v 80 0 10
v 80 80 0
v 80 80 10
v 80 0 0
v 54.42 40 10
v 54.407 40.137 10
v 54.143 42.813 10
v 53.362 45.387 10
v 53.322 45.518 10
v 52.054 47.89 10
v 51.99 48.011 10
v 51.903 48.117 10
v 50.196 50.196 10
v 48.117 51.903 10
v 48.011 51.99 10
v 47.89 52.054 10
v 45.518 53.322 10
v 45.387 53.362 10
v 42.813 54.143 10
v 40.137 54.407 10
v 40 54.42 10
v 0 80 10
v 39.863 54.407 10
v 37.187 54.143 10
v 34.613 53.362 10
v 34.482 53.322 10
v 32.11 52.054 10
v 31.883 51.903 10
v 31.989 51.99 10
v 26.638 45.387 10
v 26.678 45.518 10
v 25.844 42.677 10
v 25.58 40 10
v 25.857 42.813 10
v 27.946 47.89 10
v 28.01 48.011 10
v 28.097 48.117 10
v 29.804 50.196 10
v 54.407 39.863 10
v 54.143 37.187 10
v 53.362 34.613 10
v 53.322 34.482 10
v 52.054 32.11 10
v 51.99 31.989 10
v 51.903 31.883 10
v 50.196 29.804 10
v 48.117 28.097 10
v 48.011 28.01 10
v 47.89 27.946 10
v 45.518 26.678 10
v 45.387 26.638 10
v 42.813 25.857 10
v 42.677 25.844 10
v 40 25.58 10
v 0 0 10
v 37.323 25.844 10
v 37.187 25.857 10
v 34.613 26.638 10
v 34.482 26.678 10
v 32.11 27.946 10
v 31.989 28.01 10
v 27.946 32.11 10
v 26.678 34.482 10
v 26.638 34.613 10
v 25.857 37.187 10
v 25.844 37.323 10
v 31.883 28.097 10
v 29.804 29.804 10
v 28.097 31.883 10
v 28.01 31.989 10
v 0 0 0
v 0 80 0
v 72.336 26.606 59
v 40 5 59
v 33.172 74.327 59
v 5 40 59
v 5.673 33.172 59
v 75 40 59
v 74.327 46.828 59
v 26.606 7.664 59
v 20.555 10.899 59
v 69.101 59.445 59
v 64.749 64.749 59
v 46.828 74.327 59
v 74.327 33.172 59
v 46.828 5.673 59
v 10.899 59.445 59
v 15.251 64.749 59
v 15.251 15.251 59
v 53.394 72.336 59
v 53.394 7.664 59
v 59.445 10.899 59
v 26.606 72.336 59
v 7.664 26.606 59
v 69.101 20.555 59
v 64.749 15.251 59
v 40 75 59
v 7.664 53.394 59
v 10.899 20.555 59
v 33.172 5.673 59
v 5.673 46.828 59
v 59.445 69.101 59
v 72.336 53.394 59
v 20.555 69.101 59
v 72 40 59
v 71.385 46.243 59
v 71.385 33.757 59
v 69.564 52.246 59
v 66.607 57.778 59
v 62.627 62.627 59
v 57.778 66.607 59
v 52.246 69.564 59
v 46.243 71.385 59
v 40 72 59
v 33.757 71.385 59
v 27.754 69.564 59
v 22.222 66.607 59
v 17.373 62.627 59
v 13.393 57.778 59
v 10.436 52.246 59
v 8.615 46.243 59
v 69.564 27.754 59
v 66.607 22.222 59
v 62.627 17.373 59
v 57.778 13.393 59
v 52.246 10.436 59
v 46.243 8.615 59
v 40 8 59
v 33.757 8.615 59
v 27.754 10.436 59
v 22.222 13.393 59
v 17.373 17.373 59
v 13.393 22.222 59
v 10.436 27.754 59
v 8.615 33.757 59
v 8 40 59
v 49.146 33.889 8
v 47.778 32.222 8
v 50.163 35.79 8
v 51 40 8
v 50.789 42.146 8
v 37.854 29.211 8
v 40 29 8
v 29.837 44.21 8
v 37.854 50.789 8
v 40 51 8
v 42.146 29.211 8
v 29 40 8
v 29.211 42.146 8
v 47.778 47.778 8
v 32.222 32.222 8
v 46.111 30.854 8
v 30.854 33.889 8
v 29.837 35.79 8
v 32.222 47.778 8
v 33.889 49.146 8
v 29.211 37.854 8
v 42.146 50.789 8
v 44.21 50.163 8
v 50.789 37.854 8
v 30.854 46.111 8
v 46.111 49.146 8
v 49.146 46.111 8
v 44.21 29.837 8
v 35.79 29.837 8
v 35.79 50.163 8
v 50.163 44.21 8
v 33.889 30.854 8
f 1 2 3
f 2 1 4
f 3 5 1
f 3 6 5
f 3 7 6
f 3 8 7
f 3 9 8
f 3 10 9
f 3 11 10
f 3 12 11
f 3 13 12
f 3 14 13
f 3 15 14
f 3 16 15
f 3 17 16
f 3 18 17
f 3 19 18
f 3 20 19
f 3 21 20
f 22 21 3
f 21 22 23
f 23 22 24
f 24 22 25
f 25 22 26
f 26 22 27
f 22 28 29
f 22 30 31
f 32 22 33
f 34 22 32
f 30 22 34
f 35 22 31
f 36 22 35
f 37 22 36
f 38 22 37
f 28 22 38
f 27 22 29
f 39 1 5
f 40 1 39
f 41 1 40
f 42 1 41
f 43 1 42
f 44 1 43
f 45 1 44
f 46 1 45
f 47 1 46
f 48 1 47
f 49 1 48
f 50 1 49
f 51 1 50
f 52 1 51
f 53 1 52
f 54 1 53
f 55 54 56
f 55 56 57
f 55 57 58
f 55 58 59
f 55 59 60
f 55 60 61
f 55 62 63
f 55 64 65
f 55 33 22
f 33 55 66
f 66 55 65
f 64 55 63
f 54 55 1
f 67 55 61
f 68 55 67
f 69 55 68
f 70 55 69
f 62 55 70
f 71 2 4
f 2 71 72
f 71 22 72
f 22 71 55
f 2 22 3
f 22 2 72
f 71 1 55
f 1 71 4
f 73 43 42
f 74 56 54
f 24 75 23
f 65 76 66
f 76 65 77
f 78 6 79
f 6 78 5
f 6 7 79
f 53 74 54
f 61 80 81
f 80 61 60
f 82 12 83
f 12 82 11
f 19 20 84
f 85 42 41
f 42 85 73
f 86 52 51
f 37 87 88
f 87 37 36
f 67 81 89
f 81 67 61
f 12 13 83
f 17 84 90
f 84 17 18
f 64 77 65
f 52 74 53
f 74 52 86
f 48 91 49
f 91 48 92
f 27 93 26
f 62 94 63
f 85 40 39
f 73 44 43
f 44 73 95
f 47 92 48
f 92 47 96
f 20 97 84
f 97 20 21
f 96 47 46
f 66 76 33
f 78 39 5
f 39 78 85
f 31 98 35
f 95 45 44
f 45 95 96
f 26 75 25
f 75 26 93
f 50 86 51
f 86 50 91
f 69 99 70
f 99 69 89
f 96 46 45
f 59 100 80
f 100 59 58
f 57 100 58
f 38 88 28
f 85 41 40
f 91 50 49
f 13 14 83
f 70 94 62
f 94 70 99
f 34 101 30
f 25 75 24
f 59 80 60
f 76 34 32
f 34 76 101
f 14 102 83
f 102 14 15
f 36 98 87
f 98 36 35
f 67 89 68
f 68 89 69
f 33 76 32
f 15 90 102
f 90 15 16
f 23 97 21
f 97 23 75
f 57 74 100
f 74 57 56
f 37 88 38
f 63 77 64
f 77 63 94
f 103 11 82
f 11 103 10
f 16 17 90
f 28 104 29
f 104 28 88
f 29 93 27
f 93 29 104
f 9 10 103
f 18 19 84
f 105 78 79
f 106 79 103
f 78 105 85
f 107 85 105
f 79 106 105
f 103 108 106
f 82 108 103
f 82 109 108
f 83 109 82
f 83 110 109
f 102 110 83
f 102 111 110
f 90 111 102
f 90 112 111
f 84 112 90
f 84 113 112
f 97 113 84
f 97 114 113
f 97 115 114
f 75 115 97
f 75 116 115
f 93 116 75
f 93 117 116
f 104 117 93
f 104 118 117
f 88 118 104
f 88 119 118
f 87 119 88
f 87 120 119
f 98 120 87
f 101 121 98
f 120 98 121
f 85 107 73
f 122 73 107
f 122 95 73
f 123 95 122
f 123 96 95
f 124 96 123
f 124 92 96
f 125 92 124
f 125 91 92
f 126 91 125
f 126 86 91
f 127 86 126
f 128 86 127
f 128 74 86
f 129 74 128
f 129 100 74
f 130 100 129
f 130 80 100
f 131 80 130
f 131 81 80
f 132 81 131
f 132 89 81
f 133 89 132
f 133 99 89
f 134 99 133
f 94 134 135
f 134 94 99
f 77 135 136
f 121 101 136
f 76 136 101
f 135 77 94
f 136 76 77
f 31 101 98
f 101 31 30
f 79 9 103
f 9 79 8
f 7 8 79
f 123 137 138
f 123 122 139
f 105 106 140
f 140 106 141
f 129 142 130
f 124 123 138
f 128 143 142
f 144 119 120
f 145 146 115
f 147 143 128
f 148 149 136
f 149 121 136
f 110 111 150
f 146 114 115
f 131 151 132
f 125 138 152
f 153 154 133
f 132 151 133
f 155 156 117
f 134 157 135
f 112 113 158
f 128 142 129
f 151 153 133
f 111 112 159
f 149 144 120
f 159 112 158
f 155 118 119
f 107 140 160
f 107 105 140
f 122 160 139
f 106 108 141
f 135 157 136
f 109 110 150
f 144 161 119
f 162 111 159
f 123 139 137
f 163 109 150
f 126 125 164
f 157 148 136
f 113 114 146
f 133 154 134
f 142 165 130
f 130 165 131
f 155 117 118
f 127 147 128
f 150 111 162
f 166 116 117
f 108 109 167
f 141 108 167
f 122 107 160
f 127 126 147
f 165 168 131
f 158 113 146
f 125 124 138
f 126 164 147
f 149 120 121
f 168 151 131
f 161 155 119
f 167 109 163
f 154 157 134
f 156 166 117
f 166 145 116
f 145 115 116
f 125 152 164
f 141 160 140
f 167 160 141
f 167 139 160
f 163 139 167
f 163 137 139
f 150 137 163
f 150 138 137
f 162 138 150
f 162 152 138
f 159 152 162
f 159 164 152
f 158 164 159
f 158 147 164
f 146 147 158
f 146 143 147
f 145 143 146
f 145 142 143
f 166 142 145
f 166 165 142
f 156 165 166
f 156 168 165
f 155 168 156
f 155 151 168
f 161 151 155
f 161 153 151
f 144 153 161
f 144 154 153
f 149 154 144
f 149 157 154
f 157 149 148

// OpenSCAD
$fn = 32;

// ----------------------------------------------------------------------
// Hopper: funnel with square flange
// ----------------------------------------------------------------------

// --- parameters (mm) ---
fl = 80;                  // flange side, X and Y
fl_t = 10;                // flange thickness
cone_h = 50;              // cone height above the flange
top_d = 70;               // cone mouth diameter
bot_d = 28;               // cone spout diameter
wall = 3;                 // cone wall thickness

bore_d = bot_d - 2 * wall;  // spout bore diameter
total_h = fl_t + cone_h - 1;  // overall height

difference() {
  union() {
    cube([fl, fl, fl_t]);
    translate([fl / 2, fl / 2, fl_t - 1])
      cylinder(h = cone_h, d1 = bot_d, d2 = top_d);
  }
  translate([fl / 2, fl / 2, fl_t - 2])
    cylinder(h = cone_h + 1, d1 = bore_d, d2 = top_d - 2 * wall);
}
